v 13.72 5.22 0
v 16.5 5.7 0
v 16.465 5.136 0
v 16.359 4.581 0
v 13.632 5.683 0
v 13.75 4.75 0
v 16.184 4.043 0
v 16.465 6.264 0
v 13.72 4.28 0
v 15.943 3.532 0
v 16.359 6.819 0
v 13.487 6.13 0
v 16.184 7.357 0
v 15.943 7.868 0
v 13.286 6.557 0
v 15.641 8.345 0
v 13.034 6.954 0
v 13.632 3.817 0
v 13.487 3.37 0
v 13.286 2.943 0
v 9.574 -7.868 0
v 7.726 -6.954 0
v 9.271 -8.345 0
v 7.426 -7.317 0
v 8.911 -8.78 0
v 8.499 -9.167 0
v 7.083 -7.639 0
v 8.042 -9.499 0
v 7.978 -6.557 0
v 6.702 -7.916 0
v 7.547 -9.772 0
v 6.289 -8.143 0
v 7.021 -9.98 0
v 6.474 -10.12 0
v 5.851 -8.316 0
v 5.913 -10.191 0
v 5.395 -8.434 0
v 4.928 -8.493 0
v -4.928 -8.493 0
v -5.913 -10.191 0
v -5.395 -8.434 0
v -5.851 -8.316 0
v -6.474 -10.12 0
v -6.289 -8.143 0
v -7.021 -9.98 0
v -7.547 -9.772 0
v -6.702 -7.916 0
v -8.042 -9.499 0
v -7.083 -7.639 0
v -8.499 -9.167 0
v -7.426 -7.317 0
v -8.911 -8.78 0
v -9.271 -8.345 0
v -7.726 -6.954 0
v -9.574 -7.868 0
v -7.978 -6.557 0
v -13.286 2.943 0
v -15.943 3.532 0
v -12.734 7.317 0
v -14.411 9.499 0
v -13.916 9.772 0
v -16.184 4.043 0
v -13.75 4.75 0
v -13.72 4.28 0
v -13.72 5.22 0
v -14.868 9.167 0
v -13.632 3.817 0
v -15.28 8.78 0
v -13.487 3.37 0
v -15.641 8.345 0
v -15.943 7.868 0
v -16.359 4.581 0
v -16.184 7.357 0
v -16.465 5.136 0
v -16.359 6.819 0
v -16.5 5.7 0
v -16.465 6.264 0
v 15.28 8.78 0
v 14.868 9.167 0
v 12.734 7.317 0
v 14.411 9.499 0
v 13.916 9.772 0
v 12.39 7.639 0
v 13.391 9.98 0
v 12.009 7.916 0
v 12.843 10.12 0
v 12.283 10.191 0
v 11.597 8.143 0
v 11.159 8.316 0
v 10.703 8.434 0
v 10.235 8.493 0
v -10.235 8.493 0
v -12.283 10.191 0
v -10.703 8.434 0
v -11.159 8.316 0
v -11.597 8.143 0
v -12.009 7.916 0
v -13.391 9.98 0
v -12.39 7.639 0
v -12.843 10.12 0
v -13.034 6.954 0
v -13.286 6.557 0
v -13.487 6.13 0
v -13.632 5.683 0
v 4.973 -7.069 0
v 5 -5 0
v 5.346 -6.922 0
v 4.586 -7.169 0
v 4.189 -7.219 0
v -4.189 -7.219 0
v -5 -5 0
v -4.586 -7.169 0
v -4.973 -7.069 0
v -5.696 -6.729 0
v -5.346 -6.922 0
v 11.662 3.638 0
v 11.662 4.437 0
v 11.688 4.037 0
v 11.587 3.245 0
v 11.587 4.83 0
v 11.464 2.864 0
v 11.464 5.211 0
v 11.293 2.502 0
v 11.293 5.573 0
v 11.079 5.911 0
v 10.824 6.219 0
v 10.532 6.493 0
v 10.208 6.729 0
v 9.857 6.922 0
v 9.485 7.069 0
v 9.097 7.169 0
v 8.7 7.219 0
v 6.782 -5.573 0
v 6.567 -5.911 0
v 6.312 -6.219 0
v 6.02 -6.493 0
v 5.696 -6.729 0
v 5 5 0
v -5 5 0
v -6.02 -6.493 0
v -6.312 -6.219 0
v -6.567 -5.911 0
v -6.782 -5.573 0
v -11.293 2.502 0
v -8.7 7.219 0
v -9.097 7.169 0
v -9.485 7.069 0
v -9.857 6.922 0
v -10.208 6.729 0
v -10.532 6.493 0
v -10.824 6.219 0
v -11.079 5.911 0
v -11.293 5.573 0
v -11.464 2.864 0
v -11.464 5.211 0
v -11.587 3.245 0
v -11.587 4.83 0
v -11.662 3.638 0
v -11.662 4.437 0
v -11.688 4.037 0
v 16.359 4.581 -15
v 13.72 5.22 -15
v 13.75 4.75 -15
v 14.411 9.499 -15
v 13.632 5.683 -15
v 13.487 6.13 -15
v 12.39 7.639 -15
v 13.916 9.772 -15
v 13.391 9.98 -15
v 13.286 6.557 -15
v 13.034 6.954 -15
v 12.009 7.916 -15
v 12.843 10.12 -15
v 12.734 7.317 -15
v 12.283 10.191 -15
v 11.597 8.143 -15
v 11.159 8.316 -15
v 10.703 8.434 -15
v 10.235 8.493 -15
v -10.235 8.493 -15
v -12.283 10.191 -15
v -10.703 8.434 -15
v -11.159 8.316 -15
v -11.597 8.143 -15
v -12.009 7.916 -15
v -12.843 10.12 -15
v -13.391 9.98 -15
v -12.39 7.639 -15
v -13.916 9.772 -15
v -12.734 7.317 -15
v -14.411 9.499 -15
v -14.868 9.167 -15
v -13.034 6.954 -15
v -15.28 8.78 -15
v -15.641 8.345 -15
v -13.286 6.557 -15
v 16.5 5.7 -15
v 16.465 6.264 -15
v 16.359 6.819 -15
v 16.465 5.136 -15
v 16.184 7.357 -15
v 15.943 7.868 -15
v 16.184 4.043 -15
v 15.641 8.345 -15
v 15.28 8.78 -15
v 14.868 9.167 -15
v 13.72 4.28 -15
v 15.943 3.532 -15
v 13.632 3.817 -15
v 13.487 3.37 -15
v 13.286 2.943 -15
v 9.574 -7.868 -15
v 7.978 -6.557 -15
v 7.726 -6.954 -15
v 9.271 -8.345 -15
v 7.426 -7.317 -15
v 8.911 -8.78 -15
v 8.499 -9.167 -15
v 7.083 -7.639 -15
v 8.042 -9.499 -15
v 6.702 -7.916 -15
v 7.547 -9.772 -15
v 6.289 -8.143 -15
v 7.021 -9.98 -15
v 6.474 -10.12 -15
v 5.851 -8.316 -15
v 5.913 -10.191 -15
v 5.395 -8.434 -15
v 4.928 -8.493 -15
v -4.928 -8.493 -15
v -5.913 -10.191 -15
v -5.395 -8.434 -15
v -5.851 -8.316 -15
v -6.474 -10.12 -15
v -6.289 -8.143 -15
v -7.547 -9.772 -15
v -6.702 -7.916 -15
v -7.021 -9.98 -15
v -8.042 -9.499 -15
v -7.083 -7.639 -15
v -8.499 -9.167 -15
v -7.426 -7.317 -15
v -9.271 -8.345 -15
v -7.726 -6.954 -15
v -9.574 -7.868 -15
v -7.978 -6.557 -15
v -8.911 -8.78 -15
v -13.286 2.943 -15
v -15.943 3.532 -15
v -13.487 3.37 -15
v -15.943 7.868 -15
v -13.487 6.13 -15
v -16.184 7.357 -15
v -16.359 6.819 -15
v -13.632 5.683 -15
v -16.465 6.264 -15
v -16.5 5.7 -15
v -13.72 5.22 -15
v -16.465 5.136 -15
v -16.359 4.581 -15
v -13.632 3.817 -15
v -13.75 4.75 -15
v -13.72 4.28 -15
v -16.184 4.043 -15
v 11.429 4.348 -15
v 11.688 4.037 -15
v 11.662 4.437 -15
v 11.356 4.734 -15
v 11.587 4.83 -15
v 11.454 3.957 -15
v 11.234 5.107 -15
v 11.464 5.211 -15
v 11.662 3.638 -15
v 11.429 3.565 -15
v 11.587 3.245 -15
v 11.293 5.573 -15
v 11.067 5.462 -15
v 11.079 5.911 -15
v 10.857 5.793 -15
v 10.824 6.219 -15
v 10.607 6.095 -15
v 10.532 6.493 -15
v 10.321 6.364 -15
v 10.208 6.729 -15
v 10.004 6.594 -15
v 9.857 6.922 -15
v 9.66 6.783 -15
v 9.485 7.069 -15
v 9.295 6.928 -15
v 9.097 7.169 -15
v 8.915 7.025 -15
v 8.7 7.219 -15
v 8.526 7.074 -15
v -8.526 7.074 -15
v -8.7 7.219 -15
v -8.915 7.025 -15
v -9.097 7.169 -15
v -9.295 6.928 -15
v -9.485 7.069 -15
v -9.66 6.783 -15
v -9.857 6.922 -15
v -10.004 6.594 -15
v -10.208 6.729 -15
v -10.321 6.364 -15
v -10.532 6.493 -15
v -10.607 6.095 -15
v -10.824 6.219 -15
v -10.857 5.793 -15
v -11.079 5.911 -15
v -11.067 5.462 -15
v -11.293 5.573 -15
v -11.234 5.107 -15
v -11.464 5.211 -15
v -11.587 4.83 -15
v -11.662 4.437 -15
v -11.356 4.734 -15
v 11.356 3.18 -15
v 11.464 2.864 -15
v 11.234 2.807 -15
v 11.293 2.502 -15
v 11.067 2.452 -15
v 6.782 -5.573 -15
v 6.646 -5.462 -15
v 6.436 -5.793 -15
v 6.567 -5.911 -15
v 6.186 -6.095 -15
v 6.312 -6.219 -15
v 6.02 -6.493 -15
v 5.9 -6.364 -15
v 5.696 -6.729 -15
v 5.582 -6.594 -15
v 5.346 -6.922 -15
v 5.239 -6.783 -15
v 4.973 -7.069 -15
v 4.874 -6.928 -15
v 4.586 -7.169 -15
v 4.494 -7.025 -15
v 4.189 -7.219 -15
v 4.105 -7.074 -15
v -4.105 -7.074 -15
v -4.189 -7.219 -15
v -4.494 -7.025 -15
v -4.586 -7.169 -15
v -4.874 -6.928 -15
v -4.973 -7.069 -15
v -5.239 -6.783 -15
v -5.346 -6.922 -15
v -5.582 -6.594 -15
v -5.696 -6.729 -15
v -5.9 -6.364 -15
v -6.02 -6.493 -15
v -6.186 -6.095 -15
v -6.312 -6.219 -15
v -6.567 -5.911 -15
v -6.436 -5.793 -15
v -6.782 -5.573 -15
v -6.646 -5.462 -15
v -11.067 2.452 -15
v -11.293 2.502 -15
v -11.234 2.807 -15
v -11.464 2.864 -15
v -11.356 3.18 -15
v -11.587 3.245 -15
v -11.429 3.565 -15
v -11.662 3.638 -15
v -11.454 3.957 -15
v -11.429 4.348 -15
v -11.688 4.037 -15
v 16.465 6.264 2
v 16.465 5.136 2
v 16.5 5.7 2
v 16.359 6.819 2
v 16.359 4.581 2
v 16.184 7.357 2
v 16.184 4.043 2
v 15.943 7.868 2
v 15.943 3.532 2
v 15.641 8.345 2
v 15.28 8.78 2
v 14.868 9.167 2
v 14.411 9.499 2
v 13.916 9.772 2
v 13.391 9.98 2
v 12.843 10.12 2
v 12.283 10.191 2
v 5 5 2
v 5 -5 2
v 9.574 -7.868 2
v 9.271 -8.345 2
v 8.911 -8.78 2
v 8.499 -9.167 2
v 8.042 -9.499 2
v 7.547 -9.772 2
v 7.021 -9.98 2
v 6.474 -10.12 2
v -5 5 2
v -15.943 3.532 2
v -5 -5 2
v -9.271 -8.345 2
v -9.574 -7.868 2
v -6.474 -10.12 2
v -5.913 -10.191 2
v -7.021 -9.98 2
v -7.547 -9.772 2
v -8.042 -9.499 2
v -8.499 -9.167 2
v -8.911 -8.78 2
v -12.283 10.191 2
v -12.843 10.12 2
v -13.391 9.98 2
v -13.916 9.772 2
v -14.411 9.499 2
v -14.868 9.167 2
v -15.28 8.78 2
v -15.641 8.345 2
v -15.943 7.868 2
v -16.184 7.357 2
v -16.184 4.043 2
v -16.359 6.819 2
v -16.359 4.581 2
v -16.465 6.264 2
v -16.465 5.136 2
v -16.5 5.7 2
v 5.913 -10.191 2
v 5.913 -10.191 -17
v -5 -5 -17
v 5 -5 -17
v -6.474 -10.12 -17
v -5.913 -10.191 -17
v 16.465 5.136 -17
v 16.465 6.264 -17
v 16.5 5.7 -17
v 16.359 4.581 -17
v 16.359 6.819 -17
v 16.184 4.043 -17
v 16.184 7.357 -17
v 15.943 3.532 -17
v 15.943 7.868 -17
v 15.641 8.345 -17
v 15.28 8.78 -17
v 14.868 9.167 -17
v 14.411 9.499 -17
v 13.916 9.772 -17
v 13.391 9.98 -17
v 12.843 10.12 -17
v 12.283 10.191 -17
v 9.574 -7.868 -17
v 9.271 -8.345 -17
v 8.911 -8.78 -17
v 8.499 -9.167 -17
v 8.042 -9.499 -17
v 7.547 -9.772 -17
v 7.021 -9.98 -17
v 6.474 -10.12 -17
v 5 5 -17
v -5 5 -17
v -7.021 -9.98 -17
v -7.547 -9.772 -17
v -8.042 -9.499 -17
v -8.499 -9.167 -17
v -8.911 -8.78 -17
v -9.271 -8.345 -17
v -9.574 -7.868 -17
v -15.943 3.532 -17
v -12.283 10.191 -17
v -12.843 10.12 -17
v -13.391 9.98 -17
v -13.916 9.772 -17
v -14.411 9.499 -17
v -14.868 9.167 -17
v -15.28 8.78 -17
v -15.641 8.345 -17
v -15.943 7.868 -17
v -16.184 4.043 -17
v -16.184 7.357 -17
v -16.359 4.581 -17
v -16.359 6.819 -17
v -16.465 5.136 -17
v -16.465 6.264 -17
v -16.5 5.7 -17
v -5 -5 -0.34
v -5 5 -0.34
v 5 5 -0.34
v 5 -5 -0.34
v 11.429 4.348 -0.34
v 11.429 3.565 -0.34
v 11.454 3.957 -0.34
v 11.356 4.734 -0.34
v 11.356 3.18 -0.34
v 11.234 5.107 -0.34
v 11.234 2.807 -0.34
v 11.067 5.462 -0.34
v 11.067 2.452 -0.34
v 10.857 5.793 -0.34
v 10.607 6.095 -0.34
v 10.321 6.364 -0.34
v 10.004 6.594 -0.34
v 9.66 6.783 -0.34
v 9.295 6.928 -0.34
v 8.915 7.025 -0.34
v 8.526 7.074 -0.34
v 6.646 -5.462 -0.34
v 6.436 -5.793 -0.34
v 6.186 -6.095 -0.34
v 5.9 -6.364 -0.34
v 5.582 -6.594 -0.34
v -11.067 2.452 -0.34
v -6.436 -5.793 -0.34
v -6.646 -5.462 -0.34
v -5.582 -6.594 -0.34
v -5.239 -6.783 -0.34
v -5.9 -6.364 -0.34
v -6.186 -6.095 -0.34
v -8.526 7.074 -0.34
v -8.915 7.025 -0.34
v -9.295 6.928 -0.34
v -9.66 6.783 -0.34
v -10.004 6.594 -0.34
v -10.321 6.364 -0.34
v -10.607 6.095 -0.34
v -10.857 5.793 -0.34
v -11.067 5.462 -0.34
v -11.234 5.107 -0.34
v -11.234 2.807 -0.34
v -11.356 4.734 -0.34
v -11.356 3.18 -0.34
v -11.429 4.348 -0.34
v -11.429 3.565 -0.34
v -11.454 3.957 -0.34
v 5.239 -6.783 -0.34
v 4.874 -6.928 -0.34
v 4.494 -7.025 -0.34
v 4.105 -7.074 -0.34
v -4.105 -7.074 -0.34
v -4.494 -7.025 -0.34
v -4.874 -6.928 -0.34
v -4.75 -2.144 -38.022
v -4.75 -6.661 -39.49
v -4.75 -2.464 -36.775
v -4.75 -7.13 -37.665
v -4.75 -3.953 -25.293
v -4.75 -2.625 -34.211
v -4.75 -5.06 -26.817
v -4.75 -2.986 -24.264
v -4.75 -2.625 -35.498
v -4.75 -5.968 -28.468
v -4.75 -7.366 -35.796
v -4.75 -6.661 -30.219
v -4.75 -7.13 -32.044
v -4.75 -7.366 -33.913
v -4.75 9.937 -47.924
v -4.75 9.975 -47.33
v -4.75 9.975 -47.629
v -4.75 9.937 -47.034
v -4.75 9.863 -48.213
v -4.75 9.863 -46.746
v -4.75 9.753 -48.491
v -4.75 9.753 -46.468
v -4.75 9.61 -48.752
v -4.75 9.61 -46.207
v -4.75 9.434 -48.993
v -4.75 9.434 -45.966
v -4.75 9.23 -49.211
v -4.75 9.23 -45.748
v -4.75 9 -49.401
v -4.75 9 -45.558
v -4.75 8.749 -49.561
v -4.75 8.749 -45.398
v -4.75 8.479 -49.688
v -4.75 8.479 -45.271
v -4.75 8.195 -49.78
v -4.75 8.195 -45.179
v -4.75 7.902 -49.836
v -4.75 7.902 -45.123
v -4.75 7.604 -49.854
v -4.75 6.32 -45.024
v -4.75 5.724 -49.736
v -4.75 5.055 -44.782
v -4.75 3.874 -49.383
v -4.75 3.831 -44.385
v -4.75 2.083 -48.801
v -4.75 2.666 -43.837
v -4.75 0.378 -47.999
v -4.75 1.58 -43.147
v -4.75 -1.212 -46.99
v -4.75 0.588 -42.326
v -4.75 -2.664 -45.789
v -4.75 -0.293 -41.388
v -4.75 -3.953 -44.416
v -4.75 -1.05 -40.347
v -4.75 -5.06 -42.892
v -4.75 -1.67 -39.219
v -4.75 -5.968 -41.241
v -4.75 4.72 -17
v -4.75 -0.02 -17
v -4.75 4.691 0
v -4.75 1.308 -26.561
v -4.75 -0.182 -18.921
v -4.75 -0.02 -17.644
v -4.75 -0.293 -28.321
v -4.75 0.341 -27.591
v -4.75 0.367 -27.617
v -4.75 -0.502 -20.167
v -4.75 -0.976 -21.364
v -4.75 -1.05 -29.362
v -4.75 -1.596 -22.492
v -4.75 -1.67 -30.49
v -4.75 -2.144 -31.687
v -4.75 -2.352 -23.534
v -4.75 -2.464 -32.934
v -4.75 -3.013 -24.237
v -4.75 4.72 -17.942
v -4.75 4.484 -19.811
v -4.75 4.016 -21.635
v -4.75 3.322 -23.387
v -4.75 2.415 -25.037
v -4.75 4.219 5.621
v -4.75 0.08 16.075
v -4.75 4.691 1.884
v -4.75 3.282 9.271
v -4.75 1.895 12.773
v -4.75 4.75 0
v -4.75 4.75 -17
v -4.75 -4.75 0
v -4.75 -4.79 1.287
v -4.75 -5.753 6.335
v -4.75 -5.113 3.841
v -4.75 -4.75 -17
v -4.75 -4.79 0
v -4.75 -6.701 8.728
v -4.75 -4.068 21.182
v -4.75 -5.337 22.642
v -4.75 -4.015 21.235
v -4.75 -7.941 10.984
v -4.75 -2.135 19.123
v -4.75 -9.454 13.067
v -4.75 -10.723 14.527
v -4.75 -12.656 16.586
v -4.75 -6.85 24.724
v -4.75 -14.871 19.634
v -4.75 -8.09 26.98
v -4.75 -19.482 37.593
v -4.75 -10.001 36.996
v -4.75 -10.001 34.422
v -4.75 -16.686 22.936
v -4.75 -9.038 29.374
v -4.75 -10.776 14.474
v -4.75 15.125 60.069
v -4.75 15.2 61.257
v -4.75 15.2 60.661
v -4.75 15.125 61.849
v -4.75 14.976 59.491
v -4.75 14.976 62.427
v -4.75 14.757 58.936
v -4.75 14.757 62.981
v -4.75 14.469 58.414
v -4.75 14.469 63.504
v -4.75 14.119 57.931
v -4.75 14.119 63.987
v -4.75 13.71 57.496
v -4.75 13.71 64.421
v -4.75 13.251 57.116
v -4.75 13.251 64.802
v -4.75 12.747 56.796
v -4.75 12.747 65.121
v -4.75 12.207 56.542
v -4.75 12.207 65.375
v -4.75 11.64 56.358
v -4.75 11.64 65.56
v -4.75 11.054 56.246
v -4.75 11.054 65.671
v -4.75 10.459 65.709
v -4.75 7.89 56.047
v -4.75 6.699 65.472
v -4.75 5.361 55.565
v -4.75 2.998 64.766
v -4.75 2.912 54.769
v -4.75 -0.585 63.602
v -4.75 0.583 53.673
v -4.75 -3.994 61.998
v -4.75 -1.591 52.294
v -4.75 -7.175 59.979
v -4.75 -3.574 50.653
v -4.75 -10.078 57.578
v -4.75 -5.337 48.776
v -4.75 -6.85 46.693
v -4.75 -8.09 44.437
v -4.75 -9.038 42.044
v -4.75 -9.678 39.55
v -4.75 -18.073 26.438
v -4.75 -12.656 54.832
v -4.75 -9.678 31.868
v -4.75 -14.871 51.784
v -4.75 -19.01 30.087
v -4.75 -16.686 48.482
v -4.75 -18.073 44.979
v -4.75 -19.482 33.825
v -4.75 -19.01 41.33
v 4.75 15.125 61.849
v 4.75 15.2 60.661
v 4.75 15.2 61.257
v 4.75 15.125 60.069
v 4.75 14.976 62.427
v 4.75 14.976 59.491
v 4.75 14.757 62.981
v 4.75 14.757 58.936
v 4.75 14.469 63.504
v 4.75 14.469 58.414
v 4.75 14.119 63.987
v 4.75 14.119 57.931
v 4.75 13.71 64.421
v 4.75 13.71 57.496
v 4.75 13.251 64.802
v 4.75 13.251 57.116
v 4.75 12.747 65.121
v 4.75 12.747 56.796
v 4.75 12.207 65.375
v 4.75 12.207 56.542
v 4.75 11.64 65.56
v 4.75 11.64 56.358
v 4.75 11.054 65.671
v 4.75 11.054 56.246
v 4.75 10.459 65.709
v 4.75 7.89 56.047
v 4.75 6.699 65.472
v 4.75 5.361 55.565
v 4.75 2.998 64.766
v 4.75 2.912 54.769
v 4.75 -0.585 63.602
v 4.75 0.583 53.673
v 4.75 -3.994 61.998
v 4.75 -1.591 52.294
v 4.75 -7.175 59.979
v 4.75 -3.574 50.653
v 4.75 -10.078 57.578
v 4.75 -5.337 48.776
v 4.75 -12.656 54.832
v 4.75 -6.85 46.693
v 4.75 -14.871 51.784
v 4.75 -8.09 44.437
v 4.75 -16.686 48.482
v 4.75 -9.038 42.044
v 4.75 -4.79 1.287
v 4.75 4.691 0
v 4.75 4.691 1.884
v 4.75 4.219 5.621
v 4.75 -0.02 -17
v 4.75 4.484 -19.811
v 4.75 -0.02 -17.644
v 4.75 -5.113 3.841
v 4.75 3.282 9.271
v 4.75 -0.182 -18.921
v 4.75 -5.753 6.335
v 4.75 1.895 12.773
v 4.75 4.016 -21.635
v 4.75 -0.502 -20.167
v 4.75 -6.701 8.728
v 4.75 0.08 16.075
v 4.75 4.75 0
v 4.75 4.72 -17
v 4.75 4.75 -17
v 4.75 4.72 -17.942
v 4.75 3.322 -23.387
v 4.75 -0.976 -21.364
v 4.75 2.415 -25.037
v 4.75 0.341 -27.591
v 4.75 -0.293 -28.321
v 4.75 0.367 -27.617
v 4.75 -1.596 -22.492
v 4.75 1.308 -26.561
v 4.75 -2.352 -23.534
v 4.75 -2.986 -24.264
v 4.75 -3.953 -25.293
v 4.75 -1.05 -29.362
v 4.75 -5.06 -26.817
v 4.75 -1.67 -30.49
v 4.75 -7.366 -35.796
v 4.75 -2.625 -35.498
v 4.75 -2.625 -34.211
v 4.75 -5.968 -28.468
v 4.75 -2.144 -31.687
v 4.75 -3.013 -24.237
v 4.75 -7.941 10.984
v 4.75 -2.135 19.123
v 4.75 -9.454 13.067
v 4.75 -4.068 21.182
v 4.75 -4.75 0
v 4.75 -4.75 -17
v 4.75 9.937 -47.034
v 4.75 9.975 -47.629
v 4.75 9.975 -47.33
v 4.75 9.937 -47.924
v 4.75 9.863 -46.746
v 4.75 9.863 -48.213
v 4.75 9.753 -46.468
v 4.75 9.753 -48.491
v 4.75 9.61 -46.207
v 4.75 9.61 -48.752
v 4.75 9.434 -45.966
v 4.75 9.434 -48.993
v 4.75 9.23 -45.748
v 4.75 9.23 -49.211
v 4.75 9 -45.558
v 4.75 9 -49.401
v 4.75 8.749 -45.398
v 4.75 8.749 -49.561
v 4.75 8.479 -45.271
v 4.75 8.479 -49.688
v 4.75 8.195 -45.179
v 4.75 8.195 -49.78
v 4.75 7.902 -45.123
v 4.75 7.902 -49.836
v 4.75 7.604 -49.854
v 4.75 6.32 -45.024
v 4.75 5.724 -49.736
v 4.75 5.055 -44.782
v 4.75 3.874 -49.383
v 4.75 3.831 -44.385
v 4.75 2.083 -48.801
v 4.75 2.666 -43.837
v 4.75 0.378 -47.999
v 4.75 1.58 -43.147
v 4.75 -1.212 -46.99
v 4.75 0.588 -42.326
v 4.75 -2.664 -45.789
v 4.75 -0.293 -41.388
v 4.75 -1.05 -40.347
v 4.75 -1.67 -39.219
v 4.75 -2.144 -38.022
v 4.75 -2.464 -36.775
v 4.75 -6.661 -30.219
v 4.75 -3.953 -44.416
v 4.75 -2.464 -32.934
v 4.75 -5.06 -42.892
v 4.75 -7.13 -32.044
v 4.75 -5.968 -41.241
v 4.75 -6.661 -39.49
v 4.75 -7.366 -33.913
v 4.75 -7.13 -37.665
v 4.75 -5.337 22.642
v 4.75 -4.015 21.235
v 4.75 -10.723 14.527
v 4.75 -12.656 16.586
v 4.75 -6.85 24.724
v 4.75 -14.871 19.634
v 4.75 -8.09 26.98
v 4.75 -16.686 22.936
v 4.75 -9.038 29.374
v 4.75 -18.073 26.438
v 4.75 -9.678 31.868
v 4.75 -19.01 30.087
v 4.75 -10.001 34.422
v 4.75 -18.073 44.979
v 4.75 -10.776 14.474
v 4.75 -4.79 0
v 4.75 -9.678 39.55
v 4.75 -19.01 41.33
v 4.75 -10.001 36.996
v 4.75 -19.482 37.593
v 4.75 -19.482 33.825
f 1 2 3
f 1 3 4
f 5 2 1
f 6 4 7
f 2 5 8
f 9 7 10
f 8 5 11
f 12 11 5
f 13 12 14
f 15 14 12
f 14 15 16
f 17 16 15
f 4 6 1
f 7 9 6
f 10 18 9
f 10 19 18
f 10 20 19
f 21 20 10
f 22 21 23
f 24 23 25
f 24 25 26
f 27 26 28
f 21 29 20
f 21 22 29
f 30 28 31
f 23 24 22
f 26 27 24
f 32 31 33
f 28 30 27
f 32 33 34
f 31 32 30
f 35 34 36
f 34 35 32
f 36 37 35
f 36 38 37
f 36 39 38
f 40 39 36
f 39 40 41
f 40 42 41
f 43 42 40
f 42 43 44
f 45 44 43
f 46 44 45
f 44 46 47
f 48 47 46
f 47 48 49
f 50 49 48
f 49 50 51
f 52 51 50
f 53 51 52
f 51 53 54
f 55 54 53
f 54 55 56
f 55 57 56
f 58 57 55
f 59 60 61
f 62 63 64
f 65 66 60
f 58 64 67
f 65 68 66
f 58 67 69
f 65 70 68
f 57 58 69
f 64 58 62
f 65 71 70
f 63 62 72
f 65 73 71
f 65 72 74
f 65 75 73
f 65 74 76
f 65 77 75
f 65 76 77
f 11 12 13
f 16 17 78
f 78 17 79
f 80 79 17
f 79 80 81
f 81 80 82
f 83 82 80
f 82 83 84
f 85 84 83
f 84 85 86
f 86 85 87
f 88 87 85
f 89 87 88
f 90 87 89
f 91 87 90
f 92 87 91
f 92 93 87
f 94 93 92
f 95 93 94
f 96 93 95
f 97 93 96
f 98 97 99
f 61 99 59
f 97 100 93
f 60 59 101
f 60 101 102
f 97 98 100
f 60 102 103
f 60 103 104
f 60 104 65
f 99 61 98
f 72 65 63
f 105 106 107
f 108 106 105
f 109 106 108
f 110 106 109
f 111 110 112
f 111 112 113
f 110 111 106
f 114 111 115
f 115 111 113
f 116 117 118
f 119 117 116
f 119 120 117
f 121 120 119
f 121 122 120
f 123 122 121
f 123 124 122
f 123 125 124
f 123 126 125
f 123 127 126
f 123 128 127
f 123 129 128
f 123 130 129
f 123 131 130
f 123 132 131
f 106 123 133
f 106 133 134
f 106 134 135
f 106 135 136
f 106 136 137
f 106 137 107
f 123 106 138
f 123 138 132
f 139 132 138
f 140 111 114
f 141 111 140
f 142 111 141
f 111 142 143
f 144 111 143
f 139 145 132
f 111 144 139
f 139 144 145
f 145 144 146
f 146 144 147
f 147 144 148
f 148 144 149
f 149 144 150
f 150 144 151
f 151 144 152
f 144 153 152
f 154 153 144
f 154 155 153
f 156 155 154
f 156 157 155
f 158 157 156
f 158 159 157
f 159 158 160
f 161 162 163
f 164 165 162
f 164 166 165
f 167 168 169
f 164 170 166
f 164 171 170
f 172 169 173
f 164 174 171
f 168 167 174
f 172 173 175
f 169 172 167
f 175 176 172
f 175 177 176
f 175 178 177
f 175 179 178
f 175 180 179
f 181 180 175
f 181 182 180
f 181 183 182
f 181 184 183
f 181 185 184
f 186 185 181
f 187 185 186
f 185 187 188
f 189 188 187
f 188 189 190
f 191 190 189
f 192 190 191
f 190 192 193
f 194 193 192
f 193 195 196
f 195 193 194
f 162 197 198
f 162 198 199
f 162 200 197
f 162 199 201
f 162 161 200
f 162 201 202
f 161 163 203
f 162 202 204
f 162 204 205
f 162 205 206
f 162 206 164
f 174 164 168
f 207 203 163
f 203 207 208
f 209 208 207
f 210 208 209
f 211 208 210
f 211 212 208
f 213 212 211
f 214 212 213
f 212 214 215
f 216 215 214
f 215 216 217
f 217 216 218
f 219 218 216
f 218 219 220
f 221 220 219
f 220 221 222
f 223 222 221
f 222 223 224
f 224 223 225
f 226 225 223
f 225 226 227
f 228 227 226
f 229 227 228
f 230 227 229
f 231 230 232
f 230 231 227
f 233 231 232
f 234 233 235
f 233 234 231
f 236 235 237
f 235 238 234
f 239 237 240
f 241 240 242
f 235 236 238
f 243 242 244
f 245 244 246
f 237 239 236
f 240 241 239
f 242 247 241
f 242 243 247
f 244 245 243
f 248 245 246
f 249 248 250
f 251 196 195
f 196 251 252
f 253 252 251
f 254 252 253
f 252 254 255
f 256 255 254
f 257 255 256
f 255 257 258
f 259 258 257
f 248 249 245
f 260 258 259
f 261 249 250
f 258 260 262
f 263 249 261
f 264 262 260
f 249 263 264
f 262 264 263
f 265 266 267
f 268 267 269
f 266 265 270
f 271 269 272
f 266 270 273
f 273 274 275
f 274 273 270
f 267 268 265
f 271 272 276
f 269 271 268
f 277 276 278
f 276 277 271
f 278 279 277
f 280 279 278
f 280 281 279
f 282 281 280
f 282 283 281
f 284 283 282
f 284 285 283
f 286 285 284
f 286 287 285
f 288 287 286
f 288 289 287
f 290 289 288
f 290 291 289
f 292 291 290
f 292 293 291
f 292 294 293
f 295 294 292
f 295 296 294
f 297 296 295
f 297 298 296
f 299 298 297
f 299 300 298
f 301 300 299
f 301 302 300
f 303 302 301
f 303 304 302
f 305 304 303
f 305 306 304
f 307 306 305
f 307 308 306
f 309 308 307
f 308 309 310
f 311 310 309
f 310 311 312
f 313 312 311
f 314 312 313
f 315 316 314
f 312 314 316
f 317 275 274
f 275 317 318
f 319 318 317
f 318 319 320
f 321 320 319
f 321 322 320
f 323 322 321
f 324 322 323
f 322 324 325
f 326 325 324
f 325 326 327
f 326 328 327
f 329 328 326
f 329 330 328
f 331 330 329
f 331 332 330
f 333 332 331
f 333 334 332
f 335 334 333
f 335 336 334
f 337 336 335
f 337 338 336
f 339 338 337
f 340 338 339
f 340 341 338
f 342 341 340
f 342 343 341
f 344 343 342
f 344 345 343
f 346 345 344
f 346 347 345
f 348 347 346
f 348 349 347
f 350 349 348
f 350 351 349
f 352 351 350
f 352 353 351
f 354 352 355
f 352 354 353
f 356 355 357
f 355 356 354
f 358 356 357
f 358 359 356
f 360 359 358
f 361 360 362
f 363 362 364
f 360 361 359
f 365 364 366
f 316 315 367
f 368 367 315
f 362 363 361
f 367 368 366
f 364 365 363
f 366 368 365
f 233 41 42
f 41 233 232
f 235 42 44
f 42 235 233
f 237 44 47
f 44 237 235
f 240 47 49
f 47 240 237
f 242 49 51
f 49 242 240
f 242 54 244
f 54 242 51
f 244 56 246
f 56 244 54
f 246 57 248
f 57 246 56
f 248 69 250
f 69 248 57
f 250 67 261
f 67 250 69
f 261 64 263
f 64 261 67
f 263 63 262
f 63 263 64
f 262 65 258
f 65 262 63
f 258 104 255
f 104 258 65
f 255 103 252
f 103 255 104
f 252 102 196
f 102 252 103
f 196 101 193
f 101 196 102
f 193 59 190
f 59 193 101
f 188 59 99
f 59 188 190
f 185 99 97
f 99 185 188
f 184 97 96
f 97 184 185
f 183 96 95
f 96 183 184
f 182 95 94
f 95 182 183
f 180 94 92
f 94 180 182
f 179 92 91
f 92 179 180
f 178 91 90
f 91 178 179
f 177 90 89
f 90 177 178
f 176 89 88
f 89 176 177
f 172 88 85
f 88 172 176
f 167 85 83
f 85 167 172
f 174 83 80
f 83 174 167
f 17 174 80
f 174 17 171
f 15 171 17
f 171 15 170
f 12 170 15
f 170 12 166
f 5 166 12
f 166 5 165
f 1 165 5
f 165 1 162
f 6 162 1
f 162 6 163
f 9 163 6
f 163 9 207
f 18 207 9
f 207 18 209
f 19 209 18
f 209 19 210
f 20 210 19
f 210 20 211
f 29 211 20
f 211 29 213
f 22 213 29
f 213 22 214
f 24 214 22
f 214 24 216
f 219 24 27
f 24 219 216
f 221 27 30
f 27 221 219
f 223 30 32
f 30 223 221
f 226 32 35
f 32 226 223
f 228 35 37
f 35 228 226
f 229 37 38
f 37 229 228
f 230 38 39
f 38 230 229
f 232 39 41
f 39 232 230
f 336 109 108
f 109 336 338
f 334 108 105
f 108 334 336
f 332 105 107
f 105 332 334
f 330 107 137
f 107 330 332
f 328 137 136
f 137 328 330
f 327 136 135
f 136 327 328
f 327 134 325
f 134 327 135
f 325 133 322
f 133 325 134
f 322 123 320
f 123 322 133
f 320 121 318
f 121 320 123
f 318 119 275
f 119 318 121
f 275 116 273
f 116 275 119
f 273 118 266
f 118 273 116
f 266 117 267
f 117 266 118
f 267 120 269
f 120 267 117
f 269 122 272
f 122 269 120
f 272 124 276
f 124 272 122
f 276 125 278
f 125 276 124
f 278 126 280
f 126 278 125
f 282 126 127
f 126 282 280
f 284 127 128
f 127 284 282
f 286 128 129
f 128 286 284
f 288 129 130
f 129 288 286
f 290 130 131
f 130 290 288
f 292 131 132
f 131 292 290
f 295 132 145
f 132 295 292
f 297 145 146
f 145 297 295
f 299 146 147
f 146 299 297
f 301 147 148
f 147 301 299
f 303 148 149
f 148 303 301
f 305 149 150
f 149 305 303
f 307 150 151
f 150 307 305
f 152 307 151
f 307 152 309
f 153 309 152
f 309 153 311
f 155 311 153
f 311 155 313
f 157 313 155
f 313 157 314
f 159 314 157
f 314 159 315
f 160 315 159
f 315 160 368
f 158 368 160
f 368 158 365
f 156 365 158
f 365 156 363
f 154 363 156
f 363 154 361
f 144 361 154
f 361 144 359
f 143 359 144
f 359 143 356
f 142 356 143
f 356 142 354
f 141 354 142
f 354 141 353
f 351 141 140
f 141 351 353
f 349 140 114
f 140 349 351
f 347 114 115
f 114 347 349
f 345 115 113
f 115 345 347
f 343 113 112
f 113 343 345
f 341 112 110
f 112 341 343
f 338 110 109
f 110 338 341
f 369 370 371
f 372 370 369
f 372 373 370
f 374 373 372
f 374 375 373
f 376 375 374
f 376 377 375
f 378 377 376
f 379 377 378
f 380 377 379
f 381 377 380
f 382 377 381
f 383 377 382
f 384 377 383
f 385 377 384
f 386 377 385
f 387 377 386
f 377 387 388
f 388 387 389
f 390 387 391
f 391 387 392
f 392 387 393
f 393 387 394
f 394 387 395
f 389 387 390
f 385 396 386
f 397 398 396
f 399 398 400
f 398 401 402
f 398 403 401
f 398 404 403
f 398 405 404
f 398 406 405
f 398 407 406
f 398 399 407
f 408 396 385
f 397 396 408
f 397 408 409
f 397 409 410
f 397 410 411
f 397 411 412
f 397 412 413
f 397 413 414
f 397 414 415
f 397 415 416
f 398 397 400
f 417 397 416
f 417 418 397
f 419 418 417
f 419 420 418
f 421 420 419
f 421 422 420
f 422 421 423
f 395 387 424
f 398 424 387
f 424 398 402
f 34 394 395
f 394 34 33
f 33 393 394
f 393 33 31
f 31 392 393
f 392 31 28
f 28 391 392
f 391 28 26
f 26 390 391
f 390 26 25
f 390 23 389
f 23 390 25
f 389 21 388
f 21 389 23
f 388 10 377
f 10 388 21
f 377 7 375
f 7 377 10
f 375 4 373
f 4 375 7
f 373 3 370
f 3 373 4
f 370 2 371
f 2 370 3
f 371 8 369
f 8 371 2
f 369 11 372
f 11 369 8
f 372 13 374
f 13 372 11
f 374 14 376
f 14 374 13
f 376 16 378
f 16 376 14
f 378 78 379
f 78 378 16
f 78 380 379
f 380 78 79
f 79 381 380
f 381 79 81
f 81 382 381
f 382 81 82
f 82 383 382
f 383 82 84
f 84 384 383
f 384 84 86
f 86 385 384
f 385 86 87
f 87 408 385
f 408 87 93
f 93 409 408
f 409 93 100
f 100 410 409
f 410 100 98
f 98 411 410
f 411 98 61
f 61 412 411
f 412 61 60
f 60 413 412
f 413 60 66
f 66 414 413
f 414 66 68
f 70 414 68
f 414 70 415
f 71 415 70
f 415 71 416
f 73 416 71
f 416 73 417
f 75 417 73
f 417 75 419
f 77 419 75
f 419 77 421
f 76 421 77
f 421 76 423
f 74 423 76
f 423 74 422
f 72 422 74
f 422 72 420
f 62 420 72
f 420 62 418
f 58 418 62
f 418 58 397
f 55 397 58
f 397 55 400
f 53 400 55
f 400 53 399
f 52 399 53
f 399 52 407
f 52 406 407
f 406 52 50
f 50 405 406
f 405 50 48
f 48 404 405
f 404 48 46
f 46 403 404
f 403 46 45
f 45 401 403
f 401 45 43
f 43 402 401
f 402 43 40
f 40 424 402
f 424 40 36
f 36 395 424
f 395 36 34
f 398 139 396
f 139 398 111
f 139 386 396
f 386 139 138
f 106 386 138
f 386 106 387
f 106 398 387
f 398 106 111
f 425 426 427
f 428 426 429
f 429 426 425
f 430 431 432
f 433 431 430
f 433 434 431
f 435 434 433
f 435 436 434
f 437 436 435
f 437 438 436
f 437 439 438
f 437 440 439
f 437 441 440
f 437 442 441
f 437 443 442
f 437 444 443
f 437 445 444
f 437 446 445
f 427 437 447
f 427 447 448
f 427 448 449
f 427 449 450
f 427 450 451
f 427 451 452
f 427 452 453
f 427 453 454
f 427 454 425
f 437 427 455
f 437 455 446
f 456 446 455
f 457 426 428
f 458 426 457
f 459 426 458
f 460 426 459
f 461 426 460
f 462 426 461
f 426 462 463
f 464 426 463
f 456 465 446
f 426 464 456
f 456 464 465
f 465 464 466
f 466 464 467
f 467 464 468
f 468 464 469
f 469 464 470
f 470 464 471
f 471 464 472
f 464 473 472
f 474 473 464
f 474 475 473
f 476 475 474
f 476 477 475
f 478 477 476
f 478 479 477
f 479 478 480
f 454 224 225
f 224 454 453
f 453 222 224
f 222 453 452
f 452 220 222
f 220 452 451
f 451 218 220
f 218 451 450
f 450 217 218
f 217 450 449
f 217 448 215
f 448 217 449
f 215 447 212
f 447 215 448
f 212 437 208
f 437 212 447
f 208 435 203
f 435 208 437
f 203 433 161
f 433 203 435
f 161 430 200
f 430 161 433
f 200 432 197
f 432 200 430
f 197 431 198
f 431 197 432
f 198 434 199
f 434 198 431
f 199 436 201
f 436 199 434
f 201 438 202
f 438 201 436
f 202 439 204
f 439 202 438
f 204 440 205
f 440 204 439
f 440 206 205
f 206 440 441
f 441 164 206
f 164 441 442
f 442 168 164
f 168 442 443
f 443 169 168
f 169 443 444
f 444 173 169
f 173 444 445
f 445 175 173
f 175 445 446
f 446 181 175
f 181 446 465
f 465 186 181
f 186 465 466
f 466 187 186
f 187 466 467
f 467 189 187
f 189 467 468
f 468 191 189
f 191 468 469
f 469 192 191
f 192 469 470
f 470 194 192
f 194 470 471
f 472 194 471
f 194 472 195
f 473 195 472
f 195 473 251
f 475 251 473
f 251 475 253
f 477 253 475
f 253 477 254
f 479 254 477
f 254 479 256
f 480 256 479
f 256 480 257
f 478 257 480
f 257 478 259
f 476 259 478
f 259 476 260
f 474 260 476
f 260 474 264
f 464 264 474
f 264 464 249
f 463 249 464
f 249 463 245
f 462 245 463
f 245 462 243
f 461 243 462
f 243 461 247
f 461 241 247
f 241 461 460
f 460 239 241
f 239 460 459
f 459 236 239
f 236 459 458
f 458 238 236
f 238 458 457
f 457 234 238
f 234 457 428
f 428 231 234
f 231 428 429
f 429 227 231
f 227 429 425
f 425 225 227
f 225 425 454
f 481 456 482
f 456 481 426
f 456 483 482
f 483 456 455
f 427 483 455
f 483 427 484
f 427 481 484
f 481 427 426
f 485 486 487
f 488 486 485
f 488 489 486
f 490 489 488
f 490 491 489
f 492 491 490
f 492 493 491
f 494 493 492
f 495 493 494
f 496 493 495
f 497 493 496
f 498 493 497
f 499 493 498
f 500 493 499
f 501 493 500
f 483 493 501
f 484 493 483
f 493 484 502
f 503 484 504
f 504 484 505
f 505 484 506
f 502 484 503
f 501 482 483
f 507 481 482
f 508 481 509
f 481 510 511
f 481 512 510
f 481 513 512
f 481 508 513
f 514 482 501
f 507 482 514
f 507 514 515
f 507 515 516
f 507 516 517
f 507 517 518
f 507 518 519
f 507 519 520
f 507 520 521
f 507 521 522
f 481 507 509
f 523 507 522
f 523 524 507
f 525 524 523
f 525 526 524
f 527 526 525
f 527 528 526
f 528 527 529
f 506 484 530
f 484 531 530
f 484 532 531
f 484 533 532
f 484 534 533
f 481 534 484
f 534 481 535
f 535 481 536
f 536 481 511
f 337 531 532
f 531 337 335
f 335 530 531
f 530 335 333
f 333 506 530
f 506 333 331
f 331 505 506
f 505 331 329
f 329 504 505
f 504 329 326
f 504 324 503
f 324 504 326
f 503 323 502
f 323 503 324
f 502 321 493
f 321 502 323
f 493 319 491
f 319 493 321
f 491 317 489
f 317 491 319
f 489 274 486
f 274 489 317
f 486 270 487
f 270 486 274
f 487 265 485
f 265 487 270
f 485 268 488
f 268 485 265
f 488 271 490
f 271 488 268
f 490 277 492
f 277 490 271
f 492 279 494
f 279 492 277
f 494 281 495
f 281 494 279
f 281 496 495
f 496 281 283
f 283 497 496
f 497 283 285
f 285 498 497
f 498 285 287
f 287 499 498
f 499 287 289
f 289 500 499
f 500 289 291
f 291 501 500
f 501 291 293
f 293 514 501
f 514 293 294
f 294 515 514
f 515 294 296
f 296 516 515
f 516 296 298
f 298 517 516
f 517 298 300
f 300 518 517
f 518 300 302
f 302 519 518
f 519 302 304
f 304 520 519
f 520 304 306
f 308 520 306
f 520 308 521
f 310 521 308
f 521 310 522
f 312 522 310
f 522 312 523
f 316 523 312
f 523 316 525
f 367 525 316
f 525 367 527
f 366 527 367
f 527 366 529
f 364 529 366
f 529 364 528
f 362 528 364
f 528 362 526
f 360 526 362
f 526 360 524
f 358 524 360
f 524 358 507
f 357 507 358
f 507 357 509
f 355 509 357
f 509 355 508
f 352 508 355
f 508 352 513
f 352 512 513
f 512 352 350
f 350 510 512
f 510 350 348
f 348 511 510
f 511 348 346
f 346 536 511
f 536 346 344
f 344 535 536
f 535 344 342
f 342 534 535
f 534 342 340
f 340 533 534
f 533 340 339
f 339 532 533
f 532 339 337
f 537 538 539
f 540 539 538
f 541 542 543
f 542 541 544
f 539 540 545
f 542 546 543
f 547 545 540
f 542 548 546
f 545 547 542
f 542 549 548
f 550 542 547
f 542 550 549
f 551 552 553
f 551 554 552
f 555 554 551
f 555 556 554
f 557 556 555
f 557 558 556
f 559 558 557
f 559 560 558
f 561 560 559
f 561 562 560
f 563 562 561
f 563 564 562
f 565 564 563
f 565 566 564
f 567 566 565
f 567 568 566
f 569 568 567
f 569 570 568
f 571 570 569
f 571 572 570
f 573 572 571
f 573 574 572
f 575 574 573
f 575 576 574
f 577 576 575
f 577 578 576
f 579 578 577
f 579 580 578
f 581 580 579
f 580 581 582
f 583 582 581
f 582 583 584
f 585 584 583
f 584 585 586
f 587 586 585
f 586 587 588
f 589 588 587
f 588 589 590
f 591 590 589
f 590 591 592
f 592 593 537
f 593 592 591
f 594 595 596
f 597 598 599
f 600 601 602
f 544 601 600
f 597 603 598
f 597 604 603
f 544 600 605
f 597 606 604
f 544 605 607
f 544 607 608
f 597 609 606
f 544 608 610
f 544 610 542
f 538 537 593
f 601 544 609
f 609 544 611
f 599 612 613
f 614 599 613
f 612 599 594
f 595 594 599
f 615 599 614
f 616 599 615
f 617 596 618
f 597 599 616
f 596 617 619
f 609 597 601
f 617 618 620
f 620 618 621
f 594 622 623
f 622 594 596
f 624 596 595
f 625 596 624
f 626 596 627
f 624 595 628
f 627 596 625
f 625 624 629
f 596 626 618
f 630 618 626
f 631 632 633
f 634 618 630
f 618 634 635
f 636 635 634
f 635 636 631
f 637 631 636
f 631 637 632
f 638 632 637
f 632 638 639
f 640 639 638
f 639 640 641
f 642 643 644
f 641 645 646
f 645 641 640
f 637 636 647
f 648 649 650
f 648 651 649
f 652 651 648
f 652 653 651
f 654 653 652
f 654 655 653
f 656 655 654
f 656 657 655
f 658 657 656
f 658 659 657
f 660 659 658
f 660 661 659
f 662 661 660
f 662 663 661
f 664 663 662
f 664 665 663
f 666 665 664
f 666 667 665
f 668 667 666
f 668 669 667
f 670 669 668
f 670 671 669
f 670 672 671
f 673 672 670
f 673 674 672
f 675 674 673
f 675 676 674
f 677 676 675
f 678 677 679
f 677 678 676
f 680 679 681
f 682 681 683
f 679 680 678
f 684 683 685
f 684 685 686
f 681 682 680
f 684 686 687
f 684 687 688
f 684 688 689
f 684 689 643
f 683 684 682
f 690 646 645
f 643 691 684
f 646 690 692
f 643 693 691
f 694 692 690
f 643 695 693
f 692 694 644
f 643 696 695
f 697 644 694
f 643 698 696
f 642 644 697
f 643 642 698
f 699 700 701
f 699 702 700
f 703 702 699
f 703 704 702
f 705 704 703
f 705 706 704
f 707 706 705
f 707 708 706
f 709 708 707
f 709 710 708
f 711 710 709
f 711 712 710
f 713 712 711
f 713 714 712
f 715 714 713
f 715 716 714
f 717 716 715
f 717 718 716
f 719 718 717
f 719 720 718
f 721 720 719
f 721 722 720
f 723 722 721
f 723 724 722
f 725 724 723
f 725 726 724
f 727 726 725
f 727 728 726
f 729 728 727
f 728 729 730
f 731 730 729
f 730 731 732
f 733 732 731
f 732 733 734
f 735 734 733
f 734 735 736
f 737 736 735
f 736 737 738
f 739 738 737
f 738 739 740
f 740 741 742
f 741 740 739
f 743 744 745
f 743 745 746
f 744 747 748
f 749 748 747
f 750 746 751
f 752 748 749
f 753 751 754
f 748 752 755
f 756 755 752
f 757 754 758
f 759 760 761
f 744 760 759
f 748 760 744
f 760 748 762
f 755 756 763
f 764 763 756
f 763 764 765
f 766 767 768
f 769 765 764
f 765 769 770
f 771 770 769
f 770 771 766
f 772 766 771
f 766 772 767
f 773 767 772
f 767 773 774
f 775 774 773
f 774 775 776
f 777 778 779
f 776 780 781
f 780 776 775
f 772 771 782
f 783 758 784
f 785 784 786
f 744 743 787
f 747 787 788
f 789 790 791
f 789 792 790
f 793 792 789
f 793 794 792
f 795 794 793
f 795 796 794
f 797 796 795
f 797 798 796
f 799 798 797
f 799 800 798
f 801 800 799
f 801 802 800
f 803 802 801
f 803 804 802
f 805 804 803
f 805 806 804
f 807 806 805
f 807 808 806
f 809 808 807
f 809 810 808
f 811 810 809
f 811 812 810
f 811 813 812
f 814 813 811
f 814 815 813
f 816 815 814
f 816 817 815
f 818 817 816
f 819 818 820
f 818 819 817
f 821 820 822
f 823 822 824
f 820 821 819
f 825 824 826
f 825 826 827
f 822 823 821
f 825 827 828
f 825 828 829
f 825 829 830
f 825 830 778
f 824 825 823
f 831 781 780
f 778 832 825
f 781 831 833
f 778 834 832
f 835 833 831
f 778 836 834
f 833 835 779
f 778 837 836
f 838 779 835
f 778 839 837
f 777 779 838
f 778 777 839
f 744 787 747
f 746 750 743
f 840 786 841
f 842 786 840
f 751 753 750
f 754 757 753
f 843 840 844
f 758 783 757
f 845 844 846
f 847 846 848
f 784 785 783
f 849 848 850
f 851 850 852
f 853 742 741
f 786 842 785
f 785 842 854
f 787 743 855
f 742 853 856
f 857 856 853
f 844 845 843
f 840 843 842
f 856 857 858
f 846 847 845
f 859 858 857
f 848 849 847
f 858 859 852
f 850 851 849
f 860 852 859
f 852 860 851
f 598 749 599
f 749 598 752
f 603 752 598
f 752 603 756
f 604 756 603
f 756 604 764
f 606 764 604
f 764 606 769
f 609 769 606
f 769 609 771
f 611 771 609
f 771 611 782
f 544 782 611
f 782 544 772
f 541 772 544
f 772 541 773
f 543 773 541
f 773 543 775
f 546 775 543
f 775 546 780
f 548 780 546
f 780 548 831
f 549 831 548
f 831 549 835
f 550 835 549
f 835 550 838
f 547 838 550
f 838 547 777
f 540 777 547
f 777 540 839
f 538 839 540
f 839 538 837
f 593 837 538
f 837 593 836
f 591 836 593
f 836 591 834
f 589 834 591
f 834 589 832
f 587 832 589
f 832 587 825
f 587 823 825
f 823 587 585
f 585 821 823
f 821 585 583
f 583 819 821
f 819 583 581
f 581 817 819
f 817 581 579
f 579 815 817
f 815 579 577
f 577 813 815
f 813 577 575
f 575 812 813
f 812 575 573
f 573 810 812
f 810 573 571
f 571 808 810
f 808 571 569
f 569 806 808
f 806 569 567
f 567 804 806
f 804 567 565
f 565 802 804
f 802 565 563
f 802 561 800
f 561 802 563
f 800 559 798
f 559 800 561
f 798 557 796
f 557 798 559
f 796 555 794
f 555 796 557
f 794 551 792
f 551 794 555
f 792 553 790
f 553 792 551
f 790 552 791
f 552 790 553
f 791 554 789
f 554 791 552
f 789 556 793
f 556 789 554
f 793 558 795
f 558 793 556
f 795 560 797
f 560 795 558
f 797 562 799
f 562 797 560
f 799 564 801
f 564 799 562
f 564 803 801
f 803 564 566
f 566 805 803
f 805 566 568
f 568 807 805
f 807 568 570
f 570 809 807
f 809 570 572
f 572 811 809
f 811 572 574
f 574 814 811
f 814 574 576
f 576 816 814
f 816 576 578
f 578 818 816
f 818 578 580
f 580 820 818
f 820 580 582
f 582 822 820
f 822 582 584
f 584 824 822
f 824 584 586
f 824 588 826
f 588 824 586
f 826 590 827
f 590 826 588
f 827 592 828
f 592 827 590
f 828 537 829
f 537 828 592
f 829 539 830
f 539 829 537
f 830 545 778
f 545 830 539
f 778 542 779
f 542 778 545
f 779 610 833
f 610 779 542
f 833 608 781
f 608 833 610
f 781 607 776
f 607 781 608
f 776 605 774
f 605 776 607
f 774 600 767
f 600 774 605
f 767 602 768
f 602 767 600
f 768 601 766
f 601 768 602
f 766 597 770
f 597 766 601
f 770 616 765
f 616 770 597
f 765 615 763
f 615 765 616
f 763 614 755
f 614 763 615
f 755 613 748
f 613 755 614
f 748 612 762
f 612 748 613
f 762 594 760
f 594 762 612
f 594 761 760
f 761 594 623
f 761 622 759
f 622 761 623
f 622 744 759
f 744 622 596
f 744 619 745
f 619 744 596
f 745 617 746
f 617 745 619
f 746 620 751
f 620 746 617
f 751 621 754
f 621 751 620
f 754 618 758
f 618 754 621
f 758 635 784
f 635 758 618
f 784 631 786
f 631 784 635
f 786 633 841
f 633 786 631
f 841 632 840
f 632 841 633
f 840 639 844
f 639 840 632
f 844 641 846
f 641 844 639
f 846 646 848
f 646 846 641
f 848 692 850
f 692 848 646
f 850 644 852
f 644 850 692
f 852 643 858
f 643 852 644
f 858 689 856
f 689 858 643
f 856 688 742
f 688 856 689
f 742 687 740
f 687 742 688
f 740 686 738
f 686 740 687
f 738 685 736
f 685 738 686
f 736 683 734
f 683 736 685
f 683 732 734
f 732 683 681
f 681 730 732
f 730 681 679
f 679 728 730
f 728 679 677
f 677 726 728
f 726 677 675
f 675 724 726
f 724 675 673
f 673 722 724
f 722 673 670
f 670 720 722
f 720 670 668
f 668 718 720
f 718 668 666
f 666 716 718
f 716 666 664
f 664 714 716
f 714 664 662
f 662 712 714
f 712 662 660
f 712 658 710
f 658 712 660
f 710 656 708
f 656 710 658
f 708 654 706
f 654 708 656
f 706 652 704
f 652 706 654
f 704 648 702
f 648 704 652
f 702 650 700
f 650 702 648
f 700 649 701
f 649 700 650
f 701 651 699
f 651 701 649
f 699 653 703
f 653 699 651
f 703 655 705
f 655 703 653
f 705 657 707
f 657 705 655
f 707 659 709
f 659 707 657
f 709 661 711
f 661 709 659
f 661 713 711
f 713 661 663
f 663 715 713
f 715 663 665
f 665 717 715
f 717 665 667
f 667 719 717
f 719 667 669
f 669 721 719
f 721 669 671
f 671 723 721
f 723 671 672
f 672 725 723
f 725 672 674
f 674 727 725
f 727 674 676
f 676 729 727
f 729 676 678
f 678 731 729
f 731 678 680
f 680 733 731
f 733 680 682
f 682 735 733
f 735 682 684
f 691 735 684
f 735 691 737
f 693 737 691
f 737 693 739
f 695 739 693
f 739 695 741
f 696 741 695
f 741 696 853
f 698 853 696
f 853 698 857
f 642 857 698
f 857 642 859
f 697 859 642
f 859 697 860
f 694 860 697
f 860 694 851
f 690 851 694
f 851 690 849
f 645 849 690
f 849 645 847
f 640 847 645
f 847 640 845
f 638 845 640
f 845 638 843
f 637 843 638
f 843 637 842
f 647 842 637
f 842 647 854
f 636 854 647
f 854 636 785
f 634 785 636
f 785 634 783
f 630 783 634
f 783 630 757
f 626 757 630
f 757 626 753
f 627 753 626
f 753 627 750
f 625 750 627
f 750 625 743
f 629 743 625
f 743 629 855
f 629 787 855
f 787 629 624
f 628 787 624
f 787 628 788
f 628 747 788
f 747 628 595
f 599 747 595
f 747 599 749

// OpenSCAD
t_h = 17;
t_a = 32;
t_b = 14;
t_z = 15;
t_d = 15;
t_p = 2;
t_p_s = 1.2;
t_p_h_a = 10;
t_p_h_b = 10;
t_p_h_a_t = 0.95 * t_p_h_a;
t_p_h_b_t = 0.95 * t_p_h_b;
t_p_h_h = 0;
t_b_s = 0.85;
t2_h = 0.98 * (t_z + t_p);
t2_s = 0.98 * t_b_s;
h_r = 30;
s_h_s = 0.5;

module trapezoid() {
  translate([0, t_h/2, 0]) {
    minkowski() {
      polygon([
        [-t_a/2 + t_d/2.5, -t_d/4],
        [t_a/2 - t_d/2.5, -t_d/4],
        [t_b/2 - t_d/6.5, -t_h + t_d/4],
        [-t_b/2 + t_d/6.5, -t_h + t_d/4]
      ]);
      circle(d = t_d/2, $fn = 50);
    }
  }
}

module plate_cutout() {
  translate([0, t_p_h_h]) {
    square([t_p_h_b, t_p_h_a], center = true);
  }
}

module plate() {
  linear_extrude(height = t_p) {
    difference() {
      scale([t_p_s, t_p_s]) {
        trapezoid();
      }
      plate_cutout();
    }
  }
}

module front_face() {
  rotate([0, 180, 0]) {
    linear_extrude(height = t_z) {
      difference() {
        trapezoid();
        scale([t_b_s, t_b_s]) {
          trapezoid();
        }
      }
    }
  }
  plate();
}

module back_face() {
  translate([0, 0, -t_z - t_p]) {
    rotate([0, 0, 0]) {
      plate();
      linear_extrude(height = t2_h) {
        difference() {
          scale([t2_s, t2_s]) {
            trapezoid();
          }
          plate_cutout();
        }
      }
    }
  }
}

module hook_profile() {
  square([t_p + t_z, t_p_h_a_t]);
  translate([0, t_p_h_a_t - h_r]) {
    intersection() {
      difference() {
        circle(r = h_r, $fn = 50);
        circle(r = h_r - t_p_h_a_t, $fn = 50);
      }
      polygon([[0, 0], [-h_r, h_r], [0, h_r]]);
    }
  }
  translate([(t_p_h_a_t - 2*h_r)/sqrt(2), t_p_h_a_t - h_r + (2*h_r - t_p_h_a_t)/sqrt(2)]) {
    intersection() {
      difference() {
        circle(r = h_r, $fn = 50);
        circle(r = h_r - t_p_h_a_t, $fn = 50);
      }
      polygon([[0, 0], [h_r, -h_r], [-h_r, -h_r], [-h_r, 0]]);
    }
  }
  translate([(t_p_h_a_t - 2*h_r)/sqrt(2) - h_r + t_p_h_a_t/2, t_p_h_a_t - h_r + (2*h_r - t_p_h_a_t)/sqrt(2)]) {
    circle(d = t_p_h_a_t, $fn = 50);
  }
}

module small_hook_profile() {
  scale([s_h_s, s_h_s]) {
    mirror([1, 0]) {
      hook_profile();
    }
  }
}

module hook() {
  rotate([0, 90, 0]) {
    translate([0, -t_p_h_a_t/2, -t_p_h_a_t/2]) {
      linear_extrude(height = t_p_h_b_t) {
        hook_profile();
        translate([t_p + t_z, s_h_s*t_p_h_a_t]) {
          small_hook_profile();
        }
      }
    }
  }
}

color("Orange") front_face();
color("Yellow") back_face();
color("Red") hook();
